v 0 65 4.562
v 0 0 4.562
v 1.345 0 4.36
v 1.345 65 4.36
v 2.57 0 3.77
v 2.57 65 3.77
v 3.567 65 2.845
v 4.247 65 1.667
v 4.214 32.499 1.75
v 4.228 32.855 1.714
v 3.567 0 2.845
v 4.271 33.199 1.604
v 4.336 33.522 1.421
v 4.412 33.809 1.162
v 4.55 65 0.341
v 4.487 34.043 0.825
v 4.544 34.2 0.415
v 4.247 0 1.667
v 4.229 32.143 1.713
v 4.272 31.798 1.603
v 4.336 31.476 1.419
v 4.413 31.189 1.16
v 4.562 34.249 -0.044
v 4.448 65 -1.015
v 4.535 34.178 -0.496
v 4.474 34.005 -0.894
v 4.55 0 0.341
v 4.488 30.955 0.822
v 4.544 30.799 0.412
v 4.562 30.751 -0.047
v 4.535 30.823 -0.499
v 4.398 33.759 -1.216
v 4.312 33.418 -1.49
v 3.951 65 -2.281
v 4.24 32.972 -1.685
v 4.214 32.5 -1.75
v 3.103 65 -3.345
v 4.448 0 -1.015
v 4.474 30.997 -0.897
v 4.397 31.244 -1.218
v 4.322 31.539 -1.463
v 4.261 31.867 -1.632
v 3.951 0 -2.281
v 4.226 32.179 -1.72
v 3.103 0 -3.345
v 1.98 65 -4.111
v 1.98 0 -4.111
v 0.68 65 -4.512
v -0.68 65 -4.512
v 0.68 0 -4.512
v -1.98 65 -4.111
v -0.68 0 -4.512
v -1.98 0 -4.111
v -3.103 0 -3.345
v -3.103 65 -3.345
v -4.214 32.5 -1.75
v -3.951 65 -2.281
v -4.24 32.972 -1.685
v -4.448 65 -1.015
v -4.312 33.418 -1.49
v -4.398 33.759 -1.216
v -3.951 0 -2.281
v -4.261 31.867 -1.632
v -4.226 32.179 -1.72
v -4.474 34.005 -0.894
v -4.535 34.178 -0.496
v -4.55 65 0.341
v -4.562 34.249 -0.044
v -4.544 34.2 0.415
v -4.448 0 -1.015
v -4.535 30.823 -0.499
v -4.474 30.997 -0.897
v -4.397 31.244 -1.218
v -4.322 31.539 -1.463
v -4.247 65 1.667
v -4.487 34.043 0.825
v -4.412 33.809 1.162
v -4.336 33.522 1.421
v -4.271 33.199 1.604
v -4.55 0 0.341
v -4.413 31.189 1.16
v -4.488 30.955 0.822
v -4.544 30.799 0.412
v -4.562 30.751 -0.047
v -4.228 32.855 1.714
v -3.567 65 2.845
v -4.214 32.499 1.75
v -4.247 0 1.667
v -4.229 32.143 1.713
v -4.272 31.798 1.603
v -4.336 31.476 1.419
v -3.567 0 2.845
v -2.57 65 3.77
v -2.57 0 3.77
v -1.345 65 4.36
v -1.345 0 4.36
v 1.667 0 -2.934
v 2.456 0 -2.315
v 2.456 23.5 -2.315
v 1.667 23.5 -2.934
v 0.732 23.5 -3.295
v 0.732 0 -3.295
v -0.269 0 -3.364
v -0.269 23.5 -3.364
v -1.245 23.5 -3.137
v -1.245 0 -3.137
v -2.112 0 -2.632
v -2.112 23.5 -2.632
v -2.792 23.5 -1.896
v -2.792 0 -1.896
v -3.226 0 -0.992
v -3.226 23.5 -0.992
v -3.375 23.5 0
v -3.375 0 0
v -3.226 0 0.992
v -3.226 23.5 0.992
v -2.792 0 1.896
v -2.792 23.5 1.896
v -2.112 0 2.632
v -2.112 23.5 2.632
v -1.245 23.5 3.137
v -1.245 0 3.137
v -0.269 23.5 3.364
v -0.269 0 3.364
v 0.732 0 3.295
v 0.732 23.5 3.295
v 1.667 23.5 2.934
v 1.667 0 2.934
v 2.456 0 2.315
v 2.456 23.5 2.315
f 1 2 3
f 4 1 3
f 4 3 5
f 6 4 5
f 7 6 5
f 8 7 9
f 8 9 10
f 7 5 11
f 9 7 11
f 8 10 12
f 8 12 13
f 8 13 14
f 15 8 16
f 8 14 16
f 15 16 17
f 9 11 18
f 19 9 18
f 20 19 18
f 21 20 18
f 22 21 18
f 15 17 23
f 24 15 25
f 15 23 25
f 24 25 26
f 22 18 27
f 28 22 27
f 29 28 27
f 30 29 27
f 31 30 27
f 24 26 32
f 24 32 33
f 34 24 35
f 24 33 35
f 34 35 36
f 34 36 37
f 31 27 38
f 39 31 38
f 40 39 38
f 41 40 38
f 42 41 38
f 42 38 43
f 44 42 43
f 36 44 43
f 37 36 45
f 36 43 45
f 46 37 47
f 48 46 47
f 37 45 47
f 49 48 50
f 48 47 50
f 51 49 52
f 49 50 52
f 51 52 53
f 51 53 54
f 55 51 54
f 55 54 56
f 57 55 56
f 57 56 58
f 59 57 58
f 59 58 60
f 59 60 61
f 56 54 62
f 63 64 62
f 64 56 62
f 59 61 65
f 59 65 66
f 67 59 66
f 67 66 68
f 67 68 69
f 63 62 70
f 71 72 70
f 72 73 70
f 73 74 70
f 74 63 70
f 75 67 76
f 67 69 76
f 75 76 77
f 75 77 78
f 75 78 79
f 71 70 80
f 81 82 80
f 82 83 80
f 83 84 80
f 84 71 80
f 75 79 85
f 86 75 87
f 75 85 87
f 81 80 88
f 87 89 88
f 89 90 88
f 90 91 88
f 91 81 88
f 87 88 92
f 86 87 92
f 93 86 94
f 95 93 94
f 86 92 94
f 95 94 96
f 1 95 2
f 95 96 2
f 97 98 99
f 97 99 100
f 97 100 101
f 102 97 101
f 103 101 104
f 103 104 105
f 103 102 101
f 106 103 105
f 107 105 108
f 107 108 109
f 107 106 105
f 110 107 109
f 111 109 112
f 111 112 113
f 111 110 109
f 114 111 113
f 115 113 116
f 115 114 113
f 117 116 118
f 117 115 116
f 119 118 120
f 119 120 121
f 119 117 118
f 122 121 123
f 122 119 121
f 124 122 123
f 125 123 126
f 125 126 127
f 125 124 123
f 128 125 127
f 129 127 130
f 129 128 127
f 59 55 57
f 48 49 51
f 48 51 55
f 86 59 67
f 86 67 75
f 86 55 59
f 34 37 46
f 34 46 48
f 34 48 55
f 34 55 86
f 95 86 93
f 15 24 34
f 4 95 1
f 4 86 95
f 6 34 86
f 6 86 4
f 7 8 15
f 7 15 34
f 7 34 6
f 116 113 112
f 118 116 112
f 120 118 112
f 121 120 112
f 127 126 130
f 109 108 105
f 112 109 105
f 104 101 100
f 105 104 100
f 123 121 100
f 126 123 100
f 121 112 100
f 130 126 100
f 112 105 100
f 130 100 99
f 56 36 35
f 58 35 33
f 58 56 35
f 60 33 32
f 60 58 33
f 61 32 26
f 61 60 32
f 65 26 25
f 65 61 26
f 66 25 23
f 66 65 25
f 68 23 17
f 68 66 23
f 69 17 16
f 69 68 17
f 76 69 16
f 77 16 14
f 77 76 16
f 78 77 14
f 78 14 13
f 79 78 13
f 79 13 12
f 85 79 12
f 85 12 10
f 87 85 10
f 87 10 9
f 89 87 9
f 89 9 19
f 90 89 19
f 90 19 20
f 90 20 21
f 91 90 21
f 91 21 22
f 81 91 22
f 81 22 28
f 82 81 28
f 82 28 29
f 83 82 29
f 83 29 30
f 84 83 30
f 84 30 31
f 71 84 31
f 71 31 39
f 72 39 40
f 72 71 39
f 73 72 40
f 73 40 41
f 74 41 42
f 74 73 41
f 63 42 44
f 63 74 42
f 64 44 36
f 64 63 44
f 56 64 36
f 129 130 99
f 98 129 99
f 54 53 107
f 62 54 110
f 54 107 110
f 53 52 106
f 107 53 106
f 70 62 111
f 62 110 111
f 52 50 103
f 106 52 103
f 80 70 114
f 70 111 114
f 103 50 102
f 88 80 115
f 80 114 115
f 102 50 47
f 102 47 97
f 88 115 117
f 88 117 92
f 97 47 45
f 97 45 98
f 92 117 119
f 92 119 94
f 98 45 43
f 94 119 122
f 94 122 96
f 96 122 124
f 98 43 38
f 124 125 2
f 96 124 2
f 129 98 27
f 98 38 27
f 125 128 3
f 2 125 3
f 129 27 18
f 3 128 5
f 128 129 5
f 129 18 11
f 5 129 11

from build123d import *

# Parameters (mm, degrees)
SKETCH1_R               = 4.5625
BOSS_EXTRUDE1_DEPTH     = 65
CUT_EXTRUDE1_DEPTH      = 66.319467332
CUT_EXTRUDE1_DEPTH_BACK = 66.319467332
SKETCH2_R               = 1.75
CUT_EXTRUDE2_DEPTH      = 23.5


with BuildPart() as part:
    # Sketch1 → Boss-Extrude1 (new body)
    with BuildSketch(Plane(origin=(0, 0, 0), x_dir=(1, 0, 0), z_dir=(0, 1, 0))):
        with Locations(Location((0, 0, 0), (0, 0, 270))):
            Circle(SKETCH1_R)
    extrude(amount=BOSS_EXTRUDE1_DEPTH)

    # Sketch2 → Cut-Extrude1 (cut, two sides: drawn at the far end of the back side and taken through both)
    with BuildSketch(Plane(origin=(0, 0, 0), x_dir=(0, 0, -1), z_dir=(1, 0, 0)).offset(-CUT_EXTRUDE1_DEPTH_BACK)):
        with Locations((0, 32.5)):
            Circle(SKETCH2_R)
    extrude(amount=CUT_EXTRUDE1_DEPTH + CUT_EXTRUDE1_DEPTH_BACK, mode=Mode.SUBTRACT)

    # Sketch4 → Cut-Extrude2 (cut)
    with BuildSketch(Plane(origin=(0, 0, 0), x_dir=(-1, 0, 0), z_dir=(0, -1, 0))):
        with BuildLine():
            Line((-2.455890877, -2.315), (-2.455890877, 2.315))
            ThreePointArc((-2.455890877, 2.315), (3.375, 0), (-2.455890877, -2.315))
        make_face()
    extrude(amount=-CUT_EXTRUDE2_DEPTH, mode=Mode.SUBTRACT)


solid = part.part
